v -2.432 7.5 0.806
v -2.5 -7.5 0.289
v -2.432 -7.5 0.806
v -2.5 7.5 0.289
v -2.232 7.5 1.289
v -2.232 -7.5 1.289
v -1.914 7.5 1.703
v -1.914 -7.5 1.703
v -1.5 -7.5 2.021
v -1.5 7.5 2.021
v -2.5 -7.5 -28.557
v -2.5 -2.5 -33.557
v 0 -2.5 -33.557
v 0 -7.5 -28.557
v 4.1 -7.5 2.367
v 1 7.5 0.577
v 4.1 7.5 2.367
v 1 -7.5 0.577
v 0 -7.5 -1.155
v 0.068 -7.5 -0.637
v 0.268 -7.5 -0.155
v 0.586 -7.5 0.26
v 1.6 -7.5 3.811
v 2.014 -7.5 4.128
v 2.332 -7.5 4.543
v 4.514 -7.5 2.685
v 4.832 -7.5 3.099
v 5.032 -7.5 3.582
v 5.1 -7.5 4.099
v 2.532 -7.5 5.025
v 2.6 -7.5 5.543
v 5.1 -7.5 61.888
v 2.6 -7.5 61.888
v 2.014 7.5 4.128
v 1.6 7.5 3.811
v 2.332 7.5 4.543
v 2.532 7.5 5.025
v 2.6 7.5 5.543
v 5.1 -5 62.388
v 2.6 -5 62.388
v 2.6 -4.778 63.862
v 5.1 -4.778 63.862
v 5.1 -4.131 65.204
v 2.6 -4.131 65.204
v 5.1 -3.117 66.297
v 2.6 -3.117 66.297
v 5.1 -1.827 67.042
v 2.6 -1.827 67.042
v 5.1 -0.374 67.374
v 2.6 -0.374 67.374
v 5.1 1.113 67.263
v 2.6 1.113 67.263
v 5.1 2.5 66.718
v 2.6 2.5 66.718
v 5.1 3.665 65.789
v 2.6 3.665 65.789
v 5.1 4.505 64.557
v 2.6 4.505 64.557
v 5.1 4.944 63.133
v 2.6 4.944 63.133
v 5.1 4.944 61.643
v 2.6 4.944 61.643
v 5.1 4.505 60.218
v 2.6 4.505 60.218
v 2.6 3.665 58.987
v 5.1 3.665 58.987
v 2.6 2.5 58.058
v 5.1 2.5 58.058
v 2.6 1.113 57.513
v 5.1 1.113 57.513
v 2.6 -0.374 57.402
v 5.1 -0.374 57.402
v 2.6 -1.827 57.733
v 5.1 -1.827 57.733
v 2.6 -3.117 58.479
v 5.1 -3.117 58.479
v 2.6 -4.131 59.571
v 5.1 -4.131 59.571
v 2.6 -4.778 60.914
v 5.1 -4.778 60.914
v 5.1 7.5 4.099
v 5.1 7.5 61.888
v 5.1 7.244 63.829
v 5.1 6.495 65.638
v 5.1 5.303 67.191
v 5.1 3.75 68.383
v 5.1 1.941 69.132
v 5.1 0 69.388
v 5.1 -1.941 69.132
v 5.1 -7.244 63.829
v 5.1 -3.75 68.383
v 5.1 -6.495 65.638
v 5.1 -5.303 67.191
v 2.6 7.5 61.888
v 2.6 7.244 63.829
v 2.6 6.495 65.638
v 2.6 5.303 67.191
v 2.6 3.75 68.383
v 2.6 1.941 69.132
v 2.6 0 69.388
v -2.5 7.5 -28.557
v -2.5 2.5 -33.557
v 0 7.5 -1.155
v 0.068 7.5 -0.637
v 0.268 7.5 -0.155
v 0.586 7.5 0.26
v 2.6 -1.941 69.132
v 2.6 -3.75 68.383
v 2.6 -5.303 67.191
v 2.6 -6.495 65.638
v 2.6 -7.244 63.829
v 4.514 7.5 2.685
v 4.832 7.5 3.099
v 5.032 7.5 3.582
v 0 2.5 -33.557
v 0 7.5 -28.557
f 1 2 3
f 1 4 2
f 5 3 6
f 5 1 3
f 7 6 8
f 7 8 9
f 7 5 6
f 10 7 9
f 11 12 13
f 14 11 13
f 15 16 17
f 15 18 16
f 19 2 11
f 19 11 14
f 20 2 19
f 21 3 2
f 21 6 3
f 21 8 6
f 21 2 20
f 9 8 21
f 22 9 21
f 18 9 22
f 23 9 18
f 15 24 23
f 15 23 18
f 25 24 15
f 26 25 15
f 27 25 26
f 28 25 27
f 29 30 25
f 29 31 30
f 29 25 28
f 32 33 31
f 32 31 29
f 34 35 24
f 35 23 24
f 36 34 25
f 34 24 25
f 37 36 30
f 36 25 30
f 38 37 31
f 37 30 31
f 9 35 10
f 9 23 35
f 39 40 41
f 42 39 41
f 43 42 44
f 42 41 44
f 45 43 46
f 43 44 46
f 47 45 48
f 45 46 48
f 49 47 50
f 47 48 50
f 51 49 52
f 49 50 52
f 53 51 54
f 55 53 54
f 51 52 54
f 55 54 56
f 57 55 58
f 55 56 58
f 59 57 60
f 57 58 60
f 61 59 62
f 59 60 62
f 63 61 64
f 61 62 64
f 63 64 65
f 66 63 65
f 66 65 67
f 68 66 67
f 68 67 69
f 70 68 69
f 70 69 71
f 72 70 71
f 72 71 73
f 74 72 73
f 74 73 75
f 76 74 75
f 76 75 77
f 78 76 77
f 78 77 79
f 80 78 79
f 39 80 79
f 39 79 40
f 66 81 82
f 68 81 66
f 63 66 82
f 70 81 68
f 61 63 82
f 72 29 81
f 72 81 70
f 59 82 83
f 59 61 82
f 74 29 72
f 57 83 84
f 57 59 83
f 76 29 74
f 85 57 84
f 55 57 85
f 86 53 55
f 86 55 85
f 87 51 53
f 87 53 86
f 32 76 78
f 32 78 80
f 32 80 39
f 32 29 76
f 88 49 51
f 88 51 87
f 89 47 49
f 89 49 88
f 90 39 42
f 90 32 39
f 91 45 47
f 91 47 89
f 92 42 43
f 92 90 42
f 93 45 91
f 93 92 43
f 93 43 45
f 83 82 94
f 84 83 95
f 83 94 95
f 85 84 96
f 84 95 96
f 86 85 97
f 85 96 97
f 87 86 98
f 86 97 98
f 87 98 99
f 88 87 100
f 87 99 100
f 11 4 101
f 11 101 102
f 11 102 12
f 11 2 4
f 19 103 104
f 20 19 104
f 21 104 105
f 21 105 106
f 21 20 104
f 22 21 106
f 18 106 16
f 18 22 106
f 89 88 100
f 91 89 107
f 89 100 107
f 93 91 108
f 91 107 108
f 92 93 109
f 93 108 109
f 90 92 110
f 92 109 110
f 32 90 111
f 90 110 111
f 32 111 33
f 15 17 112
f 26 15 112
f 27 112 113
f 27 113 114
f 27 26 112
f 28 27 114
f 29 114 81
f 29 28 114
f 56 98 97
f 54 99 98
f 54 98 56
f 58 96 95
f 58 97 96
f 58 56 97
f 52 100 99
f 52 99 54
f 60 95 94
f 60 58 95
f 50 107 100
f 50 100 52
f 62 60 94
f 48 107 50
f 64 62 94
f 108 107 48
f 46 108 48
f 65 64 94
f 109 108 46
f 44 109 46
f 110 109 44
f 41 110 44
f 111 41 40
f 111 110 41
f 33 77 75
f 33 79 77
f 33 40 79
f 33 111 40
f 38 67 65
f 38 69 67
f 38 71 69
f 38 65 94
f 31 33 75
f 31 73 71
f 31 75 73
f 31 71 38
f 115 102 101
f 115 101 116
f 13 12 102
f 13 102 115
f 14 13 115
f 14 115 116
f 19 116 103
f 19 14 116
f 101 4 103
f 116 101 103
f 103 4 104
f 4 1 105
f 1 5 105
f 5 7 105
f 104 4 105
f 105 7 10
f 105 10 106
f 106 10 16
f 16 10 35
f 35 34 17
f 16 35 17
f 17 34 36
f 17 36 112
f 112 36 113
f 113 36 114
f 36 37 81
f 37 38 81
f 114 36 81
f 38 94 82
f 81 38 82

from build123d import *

# Parameters (mm, degrees)
F1_DEPTH = 7.5
F2_R     = 5
F3_DEPTH = 25
F4_SIZE  = 5
F5_R     = 2


with BuildPart() as f1:
    # F0 (on Front) → F1 (new body, symmetric)
    with BuildSketch(Plane.XZ):
        Polygon((0, -33.556624), (0, 0), (5.1, 2.944486), (5.1, 69.387862), (2.6, 69.387862), (2.6, 4.387862), (-2.5, 1.443376), (-2.5, -33.556624), align=None)
    extrude(amount=F1_DEPTH, both=True)

    # F2 (on face) → F3 (cut)
    with BuildSketch(Plane(origin=(2.6, 0, 0), x_dir=(0, -1, 0), z_dir=(-1, 0, 0))):
        with BuildLine():
            Line((-7.5, 69.387862), (-7.5, 61.887862))
            ThreePointArc((-7.5, 61.887862), (-5.303301, 67.191163), (0, 69.387862))
            Line((0, 69.387862), (-7.5, 69.387862))
        make_face()
        with Locations((0, 62.387862)):
            Circle(F2_R)
        with BuildLine():
            Line((7.5, 69.387862), (0, 69.387862))
            ThreePointArc((0, 69.387862), (5.303301, 67.191163), (7.5, 61.887862))
            Line((7.5, 61.887862), (7.5, 69.387862))
        make_face()
    extrude(amount=-F3_DEPTH, mode=Mode.SUBTRACT)

    # F4
    f4_edges = [f1.edges().sort_by_distance(p)[0] for p in [
        (-1.25, 7.5, -33.556624),
        (-1.25, -7.5, -33.556624),
    ]]
    chamfer(f4_edges, length=F4_SIZE)

    # F5
    f5_edges = [f1.edges().sort_by_distance(p)[0] for p in [
        (-2.5, 0, 1.443376),
        (2.6, 0, 4.387862),
        (5.1, 0, 2.944486),
        (0, 0, 0),
    ]]
    fillet(f5_edges, radius=F5_R)


solid = f1.part
